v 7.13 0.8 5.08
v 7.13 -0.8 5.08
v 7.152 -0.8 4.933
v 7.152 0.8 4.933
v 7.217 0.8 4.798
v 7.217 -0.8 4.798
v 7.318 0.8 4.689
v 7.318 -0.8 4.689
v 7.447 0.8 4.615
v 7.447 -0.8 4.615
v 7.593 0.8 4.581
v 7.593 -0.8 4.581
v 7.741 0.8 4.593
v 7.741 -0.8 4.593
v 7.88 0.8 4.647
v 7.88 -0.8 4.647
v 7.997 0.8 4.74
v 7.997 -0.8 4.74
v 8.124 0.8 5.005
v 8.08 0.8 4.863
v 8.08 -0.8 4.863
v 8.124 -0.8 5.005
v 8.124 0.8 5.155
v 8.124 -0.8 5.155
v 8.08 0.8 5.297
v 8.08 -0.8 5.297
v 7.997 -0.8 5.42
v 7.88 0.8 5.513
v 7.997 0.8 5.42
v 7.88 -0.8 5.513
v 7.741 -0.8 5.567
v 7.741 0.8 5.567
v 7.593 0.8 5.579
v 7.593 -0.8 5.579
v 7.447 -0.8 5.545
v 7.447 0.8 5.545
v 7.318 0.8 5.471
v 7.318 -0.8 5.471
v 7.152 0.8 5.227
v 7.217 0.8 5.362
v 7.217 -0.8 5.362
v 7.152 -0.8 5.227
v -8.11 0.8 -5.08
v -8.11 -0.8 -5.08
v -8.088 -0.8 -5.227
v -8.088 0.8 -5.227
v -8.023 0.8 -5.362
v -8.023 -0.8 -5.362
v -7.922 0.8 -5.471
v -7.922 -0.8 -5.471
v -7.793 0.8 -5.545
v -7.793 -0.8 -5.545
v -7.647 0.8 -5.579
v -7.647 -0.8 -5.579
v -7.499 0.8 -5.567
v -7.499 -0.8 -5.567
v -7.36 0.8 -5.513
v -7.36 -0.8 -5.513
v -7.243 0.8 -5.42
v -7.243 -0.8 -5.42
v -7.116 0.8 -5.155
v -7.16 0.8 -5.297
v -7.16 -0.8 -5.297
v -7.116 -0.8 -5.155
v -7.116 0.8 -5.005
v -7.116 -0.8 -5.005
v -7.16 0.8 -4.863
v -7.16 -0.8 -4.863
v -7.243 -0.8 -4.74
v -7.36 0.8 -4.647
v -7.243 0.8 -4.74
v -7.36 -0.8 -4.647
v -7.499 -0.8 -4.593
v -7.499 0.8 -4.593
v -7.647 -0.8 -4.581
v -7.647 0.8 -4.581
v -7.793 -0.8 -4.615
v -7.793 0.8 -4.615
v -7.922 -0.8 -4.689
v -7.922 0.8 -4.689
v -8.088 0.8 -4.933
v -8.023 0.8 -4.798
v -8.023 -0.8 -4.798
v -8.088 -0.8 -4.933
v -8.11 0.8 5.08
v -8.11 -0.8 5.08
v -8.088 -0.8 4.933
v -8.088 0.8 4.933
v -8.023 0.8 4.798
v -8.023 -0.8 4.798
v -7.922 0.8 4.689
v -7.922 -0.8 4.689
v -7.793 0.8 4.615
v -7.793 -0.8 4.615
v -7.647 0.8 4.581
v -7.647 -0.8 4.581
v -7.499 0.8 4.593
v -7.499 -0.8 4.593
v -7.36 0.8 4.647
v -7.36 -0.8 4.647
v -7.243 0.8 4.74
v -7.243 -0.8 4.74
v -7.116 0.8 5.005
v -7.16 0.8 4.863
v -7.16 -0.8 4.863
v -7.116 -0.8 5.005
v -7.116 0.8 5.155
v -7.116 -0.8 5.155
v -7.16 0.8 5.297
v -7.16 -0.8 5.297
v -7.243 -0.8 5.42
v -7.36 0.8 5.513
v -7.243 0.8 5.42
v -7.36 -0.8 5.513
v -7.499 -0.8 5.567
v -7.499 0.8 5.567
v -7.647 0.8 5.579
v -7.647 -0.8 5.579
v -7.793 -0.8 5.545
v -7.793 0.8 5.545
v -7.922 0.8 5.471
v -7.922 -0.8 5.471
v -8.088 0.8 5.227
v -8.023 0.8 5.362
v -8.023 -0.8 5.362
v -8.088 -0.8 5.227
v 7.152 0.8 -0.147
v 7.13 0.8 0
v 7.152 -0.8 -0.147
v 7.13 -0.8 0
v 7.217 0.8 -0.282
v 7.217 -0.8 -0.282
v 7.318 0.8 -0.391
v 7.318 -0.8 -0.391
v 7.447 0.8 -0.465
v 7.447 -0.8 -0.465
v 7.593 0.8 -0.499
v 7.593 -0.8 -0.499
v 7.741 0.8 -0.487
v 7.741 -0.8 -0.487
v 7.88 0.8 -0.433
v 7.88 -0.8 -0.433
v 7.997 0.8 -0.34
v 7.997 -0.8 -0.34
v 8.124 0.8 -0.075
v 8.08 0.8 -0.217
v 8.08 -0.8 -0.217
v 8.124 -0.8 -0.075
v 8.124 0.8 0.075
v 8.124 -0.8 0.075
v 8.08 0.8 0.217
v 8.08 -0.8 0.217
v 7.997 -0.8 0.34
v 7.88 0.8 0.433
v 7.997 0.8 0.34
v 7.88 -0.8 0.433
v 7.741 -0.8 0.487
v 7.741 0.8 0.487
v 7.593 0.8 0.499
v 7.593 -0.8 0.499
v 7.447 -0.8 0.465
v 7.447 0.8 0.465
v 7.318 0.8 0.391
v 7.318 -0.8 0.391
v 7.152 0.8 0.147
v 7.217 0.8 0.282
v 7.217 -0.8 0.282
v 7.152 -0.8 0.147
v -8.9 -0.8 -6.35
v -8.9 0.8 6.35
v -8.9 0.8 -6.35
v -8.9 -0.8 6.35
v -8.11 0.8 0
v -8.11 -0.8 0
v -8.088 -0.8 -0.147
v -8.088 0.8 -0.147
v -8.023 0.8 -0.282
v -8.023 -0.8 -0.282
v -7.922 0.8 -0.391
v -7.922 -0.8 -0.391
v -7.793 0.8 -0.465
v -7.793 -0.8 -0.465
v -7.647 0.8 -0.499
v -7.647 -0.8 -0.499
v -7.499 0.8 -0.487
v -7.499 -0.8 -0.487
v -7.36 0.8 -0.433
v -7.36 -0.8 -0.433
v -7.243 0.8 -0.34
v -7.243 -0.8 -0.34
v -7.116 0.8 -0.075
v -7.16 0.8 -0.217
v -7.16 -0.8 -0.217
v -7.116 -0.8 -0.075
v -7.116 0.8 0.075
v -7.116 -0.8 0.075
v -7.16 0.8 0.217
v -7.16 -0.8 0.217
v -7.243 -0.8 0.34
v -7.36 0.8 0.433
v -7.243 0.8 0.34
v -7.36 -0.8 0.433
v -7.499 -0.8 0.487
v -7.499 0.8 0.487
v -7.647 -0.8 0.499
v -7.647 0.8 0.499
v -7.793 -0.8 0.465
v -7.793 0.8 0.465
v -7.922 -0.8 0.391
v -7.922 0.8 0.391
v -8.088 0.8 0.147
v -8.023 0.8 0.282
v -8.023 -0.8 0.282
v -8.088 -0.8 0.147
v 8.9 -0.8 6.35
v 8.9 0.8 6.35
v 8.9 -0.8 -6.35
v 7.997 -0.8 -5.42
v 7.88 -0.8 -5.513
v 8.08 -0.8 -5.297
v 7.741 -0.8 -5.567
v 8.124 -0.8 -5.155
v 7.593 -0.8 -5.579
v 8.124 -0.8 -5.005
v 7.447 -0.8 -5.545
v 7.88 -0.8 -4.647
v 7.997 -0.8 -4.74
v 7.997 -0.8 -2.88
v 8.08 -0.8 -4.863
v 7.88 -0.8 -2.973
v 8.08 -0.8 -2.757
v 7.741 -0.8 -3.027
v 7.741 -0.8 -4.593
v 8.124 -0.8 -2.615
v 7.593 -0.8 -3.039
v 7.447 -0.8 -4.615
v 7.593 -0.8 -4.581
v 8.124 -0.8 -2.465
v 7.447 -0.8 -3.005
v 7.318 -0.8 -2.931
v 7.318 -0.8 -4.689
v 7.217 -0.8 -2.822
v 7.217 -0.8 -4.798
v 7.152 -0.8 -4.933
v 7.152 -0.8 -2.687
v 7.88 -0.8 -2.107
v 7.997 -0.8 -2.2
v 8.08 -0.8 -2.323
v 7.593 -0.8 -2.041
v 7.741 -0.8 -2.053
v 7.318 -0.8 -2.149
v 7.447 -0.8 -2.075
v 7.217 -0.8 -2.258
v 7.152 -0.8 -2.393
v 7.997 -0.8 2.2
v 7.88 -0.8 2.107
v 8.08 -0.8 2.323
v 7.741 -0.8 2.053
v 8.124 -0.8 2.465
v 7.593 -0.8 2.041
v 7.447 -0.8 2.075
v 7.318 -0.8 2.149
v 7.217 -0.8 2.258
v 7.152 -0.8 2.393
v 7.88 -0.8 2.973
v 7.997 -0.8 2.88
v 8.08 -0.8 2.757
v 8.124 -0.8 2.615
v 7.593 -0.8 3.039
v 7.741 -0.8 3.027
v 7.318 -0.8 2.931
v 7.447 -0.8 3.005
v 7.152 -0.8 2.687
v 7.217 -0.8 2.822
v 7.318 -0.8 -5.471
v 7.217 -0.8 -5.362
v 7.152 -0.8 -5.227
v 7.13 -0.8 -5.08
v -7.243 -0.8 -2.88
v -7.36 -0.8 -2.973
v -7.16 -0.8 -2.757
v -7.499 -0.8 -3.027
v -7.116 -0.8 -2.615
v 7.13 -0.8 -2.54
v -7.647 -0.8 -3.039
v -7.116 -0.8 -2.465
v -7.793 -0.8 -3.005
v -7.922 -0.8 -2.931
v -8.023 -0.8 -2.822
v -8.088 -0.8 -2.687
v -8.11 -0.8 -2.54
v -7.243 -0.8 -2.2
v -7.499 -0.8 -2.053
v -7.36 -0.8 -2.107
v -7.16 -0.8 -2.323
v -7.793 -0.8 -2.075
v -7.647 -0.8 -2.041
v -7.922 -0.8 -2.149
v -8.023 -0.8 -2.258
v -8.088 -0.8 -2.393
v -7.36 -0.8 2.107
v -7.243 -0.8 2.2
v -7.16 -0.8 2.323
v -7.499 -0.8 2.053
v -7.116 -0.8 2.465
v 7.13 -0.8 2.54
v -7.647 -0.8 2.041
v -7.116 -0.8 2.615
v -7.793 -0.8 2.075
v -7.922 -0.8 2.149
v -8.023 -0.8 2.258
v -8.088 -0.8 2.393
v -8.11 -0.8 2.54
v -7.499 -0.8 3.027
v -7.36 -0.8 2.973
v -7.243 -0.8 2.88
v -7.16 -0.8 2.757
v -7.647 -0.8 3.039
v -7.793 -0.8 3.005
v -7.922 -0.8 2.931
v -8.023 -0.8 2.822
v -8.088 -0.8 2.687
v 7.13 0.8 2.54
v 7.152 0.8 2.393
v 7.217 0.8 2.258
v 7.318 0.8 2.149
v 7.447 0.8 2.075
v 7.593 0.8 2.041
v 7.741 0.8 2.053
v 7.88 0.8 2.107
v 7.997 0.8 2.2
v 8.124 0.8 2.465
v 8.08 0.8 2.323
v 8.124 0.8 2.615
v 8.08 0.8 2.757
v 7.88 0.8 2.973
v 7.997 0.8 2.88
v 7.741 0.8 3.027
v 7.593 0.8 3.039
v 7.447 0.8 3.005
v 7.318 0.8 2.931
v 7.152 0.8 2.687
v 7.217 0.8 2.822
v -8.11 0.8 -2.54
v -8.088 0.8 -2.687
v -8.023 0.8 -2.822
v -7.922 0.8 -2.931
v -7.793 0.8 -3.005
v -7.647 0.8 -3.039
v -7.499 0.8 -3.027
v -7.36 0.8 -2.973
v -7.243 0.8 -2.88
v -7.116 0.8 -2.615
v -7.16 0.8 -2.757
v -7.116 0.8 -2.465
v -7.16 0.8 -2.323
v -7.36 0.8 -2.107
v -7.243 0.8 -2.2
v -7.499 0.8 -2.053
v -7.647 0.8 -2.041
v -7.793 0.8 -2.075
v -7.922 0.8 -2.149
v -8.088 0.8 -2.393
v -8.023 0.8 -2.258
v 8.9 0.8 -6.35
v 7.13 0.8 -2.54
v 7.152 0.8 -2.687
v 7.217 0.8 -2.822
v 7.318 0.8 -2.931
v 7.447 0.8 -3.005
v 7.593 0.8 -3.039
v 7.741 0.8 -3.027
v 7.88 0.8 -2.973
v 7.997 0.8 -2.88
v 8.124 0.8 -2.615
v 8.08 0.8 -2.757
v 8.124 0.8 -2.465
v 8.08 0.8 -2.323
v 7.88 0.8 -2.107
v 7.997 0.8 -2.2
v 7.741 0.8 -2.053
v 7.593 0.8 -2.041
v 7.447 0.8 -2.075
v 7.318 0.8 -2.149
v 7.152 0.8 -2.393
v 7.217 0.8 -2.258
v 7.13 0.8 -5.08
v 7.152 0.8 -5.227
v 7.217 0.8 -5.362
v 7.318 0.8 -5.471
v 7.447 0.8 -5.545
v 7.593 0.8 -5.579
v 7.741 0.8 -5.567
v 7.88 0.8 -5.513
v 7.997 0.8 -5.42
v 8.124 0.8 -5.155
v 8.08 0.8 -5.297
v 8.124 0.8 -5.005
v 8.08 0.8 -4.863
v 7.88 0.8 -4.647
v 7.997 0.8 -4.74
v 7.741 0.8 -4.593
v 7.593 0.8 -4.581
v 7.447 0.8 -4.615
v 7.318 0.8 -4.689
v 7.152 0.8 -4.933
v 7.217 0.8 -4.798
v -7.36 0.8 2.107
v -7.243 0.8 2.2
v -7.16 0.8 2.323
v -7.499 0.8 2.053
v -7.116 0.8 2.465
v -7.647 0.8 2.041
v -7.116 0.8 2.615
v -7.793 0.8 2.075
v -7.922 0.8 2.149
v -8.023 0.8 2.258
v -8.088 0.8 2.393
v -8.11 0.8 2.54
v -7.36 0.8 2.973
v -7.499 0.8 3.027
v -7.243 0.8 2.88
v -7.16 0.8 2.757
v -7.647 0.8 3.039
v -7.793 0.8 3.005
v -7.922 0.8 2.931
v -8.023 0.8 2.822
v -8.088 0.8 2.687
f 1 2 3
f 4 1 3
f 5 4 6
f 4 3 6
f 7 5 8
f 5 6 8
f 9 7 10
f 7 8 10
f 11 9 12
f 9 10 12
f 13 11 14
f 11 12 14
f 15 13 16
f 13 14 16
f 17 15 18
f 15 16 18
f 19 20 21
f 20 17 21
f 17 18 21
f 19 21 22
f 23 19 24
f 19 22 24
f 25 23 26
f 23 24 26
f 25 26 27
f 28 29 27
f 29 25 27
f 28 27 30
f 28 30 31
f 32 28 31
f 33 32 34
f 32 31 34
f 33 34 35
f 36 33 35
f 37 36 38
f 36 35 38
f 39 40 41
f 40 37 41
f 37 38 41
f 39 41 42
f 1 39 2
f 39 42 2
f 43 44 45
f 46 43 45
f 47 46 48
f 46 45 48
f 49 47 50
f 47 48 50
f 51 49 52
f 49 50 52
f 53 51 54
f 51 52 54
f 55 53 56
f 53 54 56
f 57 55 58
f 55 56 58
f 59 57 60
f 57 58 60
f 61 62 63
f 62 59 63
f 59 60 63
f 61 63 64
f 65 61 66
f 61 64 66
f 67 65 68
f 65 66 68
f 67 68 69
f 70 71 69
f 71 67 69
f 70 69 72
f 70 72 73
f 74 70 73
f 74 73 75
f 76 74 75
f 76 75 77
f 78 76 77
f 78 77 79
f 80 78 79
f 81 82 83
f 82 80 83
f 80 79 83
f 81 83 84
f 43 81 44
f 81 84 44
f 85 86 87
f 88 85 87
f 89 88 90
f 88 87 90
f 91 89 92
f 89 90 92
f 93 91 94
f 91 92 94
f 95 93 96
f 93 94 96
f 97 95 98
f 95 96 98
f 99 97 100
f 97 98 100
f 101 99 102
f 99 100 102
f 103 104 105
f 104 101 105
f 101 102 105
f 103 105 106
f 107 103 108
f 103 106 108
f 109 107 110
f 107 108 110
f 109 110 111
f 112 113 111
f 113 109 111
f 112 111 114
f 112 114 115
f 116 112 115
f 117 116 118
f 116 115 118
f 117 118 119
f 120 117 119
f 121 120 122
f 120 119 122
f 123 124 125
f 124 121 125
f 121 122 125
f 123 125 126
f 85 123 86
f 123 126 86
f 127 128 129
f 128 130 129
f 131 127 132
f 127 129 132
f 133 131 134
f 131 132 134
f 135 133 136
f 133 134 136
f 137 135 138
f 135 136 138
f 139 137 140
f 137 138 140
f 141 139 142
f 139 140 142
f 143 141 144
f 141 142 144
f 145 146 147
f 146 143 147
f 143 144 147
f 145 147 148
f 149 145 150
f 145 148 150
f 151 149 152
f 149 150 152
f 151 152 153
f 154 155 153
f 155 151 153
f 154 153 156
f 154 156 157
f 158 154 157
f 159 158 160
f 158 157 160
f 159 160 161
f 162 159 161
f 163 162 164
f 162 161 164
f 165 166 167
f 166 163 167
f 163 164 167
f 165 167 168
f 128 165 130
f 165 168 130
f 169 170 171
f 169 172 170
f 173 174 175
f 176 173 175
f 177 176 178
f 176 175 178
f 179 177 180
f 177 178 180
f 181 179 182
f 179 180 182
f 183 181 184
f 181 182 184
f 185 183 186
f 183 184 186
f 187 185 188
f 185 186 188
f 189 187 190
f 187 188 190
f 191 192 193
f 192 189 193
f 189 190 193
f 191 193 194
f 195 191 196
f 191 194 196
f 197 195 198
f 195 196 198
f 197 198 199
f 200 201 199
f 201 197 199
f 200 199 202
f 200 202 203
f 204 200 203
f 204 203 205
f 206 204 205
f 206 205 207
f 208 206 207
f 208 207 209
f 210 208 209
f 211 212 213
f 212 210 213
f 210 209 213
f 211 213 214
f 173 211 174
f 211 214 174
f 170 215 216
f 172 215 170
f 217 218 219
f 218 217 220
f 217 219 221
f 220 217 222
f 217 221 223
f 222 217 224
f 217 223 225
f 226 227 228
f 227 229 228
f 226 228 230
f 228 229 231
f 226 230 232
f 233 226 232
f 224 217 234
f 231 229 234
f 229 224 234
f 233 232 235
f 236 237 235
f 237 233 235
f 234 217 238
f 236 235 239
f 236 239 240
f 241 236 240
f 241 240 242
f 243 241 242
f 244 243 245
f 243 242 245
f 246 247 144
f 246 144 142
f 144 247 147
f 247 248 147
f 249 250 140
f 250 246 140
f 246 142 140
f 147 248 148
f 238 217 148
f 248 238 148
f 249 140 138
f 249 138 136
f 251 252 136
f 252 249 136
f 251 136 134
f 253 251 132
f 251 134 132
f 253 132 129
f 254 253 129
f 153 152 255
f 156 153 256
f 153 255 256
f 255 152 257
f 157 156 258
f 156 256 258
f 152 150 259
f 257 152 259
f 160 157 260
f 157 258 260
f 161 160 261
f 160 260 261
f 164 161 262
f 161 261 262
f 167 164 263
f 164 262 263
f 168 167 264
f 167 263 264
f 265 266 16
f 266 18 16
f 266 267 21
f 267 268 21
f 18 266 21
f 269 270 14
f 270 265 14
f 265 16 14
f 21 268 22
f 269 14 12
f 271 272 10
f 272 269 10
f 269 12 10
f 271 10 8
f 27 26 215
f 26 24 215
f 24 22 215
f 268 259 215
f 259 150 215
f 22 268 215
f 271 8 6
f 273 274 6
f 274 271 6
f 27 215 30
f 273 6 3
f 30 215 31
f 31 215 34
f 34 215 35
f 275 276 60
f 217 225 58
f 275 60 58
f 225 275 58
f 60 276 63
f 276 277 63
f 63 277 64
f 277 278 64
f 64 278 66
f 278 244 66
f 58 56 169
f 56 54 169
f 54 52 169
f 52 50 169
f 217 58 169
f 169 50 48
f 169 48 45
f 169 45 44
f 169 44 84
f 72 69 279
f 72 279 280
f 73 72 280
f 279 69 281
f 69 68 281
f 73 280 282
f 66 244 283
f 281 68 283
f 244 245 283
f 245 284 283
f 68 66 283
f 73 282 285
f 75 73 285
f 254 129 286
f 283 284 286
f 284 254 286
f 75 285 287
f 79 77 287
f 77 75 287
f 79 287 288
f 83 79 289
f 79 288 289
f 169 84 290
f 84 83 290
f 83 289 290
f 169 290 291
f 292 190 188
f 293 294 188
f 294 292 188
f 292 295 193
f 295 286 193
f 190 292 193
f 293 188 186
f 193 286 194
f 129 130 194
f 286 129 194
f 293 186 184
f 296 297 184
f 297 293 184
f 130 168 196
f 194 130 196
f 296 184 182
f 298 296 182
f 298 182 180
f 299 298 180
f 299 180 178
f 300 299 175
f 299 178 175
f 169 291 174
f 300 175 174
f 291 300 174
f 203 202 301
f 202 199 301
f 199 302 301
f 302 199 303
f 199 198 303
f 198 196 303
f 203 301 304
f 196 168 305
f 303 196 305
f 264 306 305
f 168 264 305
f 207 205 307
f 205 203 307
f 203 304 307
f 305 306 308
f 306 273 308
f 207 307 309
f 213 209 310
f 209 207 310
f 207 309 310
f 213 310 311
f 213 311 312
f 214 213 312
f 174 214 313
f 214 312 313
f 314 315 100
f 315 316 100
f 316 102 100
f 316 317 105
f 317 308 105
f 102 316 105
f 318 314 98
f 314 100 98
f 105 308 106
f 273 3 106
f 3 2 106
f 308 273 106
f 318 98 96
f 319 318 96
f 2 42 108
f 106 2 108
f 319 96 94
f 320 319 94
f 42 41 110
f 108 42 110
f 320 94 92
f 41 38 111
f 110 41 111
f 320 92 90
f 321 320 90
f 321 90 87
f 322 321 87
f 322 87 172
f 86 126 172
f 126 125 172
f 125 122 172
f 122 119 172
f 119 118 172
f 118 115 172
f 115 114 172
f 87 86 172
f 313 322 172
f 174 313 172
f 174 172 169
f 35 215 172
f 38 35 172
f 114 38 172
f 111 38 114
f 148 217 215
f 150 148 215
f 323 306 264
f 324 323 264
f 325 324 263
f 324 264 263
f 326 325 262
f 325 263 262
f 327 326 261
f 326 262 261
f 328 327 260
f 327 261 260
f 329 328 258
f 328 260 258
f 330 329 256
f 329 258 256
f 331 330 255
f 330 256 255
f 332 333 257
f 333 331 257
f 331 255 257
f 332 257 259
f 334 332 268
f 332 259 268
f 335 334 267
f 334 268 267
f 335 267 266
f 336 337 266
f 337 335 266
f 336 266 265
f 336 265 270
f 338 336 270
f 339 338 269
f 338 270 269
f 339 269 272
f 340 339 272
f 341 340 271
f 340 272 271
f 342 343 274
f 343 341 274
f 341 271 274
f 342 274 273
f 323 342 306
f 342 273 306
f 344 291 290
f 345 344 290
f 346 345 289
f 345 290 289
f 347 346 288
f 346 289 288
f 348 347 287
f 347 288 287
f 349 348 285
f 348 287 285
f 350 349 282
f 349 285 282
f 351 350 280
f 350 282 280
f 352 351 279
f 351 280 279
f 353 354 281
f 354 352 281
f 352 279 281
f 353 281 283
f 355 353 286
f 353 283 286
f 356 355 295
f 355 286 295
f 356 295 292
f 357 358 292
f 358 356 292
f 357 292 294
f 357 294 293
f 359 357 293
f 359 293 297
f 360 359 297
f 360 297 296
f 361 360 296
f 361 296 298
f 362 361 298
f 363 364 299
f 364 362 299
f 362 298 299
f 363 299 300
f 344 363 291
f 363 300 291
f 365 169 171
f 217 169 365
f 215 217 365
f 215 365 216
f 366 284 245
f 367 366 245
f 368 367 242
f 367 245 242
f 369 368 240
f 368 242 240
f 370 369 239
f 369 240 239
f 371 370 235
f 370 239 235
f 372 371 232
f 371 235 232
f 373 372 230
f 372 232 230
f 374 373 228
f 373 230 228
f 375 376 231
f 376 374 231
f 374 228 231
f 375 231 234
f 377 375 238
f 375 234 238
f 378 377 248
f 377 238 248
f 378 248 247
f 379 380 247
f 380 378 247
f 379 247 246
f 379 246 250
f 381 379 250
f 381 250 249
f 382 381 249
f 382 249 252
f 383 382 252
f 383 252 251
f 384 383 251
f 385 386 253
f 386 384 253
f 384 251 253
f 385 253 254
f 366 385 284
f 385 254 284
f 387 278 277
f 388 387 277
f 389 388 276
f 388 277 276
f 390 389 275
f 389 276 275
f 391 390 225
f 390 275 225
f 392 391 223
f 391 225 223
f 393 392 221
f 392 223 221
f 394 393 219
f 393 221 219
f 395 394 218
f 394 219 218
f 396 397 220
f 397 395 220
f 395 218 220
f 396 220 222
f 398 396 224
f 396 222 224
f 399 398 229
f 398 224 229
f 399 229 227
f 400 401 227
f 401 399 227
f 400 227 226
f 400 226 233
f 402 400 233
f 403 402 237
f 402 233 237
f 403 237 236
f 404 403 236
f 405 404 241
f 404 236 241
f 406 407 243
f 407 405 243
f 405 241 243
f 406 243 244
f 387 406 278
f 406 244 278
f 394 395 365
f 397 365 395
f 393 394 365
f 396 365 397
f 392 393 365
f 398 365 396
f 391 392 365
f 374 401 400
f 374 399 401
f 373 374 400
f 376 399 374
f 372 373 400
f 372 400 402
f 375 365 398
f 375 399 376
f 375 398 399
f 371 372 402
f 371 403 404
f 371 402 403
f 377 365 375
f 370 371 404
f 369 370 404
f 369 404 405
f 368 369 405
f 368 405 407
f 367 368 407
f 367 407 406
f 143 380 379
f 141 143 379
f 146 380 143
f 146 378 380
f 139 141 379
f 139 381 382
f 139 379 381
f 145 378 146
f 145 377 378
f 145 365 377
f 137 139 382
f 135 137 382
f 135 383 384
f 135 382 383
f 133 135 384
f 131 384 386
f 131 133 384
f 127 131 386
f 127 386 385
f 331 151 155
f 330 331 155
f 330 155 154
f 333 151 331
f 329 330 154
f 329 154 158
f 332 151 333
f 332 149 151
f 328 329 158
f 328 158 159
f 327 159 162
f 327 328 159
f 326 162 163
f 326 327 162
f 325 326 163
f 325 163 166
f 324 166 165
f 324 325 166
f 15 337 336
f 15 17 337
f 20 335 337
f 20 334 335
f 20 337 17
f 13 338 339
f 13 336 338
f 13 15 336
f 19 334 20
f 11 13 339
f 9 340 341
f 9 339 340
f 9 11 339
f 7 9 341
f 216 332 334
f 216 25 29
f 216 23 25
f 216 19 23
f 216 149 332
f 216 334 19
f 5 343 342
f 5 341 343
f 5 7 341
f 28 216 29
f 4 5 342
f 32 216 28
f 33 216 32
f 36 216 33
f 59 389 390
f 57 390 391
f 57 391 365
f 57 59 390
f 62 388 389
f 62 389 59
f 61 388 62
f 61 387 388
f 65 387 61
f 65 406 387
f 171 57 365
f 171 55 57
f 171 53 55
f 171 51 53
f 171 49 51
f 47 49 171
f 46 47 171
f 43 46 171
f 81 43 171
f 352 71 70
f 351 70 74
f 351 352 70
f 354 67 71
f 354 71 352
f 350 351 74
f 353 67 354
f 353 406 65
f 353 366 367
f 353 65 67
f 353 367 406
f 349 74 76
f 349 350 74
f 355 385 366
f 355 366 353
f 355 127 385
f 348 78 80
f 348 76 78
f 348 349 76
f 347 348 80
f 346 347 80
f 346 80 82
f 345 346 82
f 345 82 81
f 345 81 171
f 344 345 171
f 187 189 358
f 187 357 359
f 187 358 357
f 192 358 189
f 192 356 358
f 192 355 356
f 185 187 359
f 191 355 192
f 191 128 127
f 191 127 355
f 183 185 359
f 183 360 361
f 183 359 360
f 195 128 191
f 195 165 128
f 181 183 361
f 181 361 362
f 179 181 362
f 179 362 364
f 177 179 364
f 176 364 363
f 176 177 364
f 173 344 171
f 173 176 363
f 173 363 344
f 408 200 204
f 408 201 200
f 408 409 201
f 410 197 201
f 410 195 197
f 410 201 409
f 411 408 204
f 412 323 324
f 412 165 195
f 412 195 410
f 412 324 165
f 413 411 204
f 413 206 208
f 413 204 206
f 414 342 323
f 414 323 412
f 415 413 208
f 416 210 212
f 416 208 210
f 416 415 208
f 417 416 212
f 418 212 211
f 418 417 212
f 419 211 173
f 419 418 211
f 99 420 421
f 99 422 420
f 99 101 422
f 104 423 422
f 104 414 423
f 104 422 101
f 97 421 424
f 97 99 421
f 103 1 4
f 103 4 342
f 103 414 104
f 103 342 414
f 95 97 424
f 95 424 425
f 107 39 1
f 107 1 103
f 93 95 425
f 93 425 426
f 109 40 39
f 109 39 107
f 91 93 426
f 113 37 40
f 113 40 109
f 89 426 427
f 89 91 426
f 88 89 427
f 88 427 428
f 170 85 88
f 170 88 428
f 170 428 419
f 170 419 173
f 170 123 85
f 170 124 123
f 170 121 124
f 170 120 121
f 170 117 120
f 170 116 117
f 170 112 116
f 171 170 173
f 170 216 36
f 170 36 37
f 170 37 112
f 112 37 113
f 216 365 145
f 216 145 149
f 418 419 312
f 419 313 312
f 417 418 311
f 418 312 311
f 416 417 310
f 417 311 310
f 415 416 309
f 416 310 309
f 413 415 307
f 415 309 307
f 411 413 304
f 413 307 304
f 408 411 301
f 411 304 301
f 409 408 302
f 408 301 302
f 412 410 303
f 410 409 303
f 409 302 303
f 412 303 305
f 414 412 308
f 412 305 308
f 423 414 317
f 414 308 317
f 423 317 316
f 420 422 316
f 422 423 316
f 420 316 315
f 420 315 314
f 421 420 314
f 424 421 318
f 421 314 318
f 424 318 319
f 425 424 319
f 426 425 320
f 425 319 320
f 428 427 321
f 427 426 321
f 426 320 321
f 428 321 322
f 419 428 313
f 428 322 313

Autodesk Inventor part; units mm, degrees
ref_plane "YZ Plane" through (0, 0, 0) normal (1, 0, 0) x (0, 1, 0)
sketch "Sketch2" plane through (0, 0, 0) normal (0, 1, 0) x (-1, 0, 0)
  line L0 (-8.9, 6.35) -> (8.9, 6.35)
  line L1 (8.9, 6.35) -> (8.9, -6.35)
  line L2 (8.9, -6.35) -> (-8.9, -6.35)
  line L3 (-8.9, -6.35) -> (-8.9, 6.35)
  line L4 (-8.9, 6.35) -> (8.9, -6.35) construction
  line L5 (8.9, 6.35) -> (-8.9, -6.35) construction
  circle A0 centre (-7.63, 5.08) radius 0.5
  circle A1 centre (-7.63, 2.54) radius 0.5
  circle A2 centre (-7.63, -2.54) radius 0.5
  circle A3 centre (-7.63, -5.08) radius 0.5
  circle A4 centre (7.61, -5.08) radius 0.5
  circle A5 centre (7.61, -2.54) radius 0.5
  circle A6 centre (7.61, 0) radius 0.5
  circle A7 centre (7.61, 2.54) radius 0.5
  circle A8 centre (7.61, 5.08) radius 0.5
  circle A9 centre (-7.63, 0) radius 0.5
  point P0 (0, 0)
  point P1 (-7.63, -5.08)
  point P2 (-7.63, -2.54)
  point P3 (-7.63, 0)
  point P4 (-7.63, 2.54)
  point P5 (7.61, -2.54)
  point P6 (7.61, 2.54)
  dimension "d1" = 17.8
  dimension "d2" = 12.7
  dimension "d5" = 1.27
  dimension "d6" = 1.27
  dimension "d9" = 2.54
  dimension "d12" = 15.24
  dimension "d15" = 1
  dimension "d20" = 1
  dimension "d25" = 1
  dimension "d30" = 1
  dimension "d35" = 1
  dimension "d40" = 1
  dimension "d45" = 1
  dimension "d50" = 1
  dimension "d55" = 1
  dimension "d60" = 1
extrude "Extrusion2" add sketch "Sketch2" along normal mid plane 1.6
ref_plane "Work Plane1" through (0, 8.55, 0) normal (0, 1, 0) x (1, 0, 0)
sketch "Sketch3" plane through (0, 8.55, 0) normal (0, 1, 0) x (1, 0, 0)
  line L0 (-8.9372, -7.2611) -> (-8.9372, 7.6441) construction
  line L1 (-8.9372, 7.6441) -> (9.9152, 7.6441) construction
  line L2 (9.9152, 7.6441) -> (9.9152, -7.2611) construction
  line L3 (9.9152, -7.2611) -> (-8.9372, -7.2611) construction
  circle A0 centre (7.63, 0) radius 0.5 projected
  circle A1 centre (-7.61, -5.08) radius 0.5 projected
  circle A2 centre (-7.61, -2.54) radius 0.5 projected
  circle A3 centre (-7.61, 0) radius 0.5 projected
  circle A4 centre (-7.61, 2.54) radius 0.5 projected
  circle A5 centre (-7.61, 5.08) radius 0.5 projected
  circle A6 centre (7.63, 5.08) radius 0.5 projected
  circle A7 centre (7.63, 2.54) radius 0.5 projected
  circle A8 centre (7.63, -2.54) radius 0.5 projected
  circle A9 centre (7.63, -5.08) radius 0.5 projected
  line L4 (-8.9, -6.35) -> (8.9, -6.35) projected
  line L5 (8.9, -6.35) -> (8.9, 6.35) projected
  line L6 (8.9, 6.35) -> (-8.9, 6.35) projected
  line L7 (-8.9, 6.35) -> (-8.9, -6.35) projected
  point P0 (0, 0)
decal "Decal1"
ref_plane "Work Plane2" through (0, -20.05, 0) normal (0, -1, 0) x (1, 0, 0)
sketch "Sketch4" plane through (0, -20.05, 0) normal (0, -1, 0) x (1, 0, 0)
  line L0 (-9.0888, -7.7888) -> (-9.0888, 7.0827) construction
  line L1 (-9.0888, 7.0827) -> (9.7209, 7.0827) construction
  line L2 (9.7209, 7.0827) -> (9.7209, -7.7888) construction
  line L3 (9.7209, -7.7888) -> (-9.0888, -7.7888) construction
  circle A0 centre (7.63, 0) radius 0.5 projected
  circle A1 centre (-7.61, 5.08) radius 0.5 projected
  circle A2 centre (-7.61, 2.54) radius 0.5 projected
  circle A3 centre (-7.61, 0) radius 0.5 projected
  circle A4 centre (-7.61, -2.54) radius 0.5 projected
  circle A5 centre (-7.61, -5.08) radius 0.5 projected
  circle A6 centre (7.63, -5.08) radius 0.5 projected
  circle A7 centre (7.63, -2.54) radius 0.5 projected
  circle A8 centre (7.63, 2.54) radius 0.5 projected
  circle A9 centre (7.63, 5.08) radius 0.5 projected
  line L4 (8.9, 6.35) -> (-8.9, 6.35) projected
  line L5 (-8.9, 6.35) -> (-8.9, -6.35) projected
  line L6 (-8.9, -6.35) -> (8.9, -6.35) projected
  line L7 (8.9, -6.35) -> (8.9, 6.35) projected
  point P0 (0, 0)
decal "Decal2"
properties part number "microsdadapterboard" material "GFRC"
